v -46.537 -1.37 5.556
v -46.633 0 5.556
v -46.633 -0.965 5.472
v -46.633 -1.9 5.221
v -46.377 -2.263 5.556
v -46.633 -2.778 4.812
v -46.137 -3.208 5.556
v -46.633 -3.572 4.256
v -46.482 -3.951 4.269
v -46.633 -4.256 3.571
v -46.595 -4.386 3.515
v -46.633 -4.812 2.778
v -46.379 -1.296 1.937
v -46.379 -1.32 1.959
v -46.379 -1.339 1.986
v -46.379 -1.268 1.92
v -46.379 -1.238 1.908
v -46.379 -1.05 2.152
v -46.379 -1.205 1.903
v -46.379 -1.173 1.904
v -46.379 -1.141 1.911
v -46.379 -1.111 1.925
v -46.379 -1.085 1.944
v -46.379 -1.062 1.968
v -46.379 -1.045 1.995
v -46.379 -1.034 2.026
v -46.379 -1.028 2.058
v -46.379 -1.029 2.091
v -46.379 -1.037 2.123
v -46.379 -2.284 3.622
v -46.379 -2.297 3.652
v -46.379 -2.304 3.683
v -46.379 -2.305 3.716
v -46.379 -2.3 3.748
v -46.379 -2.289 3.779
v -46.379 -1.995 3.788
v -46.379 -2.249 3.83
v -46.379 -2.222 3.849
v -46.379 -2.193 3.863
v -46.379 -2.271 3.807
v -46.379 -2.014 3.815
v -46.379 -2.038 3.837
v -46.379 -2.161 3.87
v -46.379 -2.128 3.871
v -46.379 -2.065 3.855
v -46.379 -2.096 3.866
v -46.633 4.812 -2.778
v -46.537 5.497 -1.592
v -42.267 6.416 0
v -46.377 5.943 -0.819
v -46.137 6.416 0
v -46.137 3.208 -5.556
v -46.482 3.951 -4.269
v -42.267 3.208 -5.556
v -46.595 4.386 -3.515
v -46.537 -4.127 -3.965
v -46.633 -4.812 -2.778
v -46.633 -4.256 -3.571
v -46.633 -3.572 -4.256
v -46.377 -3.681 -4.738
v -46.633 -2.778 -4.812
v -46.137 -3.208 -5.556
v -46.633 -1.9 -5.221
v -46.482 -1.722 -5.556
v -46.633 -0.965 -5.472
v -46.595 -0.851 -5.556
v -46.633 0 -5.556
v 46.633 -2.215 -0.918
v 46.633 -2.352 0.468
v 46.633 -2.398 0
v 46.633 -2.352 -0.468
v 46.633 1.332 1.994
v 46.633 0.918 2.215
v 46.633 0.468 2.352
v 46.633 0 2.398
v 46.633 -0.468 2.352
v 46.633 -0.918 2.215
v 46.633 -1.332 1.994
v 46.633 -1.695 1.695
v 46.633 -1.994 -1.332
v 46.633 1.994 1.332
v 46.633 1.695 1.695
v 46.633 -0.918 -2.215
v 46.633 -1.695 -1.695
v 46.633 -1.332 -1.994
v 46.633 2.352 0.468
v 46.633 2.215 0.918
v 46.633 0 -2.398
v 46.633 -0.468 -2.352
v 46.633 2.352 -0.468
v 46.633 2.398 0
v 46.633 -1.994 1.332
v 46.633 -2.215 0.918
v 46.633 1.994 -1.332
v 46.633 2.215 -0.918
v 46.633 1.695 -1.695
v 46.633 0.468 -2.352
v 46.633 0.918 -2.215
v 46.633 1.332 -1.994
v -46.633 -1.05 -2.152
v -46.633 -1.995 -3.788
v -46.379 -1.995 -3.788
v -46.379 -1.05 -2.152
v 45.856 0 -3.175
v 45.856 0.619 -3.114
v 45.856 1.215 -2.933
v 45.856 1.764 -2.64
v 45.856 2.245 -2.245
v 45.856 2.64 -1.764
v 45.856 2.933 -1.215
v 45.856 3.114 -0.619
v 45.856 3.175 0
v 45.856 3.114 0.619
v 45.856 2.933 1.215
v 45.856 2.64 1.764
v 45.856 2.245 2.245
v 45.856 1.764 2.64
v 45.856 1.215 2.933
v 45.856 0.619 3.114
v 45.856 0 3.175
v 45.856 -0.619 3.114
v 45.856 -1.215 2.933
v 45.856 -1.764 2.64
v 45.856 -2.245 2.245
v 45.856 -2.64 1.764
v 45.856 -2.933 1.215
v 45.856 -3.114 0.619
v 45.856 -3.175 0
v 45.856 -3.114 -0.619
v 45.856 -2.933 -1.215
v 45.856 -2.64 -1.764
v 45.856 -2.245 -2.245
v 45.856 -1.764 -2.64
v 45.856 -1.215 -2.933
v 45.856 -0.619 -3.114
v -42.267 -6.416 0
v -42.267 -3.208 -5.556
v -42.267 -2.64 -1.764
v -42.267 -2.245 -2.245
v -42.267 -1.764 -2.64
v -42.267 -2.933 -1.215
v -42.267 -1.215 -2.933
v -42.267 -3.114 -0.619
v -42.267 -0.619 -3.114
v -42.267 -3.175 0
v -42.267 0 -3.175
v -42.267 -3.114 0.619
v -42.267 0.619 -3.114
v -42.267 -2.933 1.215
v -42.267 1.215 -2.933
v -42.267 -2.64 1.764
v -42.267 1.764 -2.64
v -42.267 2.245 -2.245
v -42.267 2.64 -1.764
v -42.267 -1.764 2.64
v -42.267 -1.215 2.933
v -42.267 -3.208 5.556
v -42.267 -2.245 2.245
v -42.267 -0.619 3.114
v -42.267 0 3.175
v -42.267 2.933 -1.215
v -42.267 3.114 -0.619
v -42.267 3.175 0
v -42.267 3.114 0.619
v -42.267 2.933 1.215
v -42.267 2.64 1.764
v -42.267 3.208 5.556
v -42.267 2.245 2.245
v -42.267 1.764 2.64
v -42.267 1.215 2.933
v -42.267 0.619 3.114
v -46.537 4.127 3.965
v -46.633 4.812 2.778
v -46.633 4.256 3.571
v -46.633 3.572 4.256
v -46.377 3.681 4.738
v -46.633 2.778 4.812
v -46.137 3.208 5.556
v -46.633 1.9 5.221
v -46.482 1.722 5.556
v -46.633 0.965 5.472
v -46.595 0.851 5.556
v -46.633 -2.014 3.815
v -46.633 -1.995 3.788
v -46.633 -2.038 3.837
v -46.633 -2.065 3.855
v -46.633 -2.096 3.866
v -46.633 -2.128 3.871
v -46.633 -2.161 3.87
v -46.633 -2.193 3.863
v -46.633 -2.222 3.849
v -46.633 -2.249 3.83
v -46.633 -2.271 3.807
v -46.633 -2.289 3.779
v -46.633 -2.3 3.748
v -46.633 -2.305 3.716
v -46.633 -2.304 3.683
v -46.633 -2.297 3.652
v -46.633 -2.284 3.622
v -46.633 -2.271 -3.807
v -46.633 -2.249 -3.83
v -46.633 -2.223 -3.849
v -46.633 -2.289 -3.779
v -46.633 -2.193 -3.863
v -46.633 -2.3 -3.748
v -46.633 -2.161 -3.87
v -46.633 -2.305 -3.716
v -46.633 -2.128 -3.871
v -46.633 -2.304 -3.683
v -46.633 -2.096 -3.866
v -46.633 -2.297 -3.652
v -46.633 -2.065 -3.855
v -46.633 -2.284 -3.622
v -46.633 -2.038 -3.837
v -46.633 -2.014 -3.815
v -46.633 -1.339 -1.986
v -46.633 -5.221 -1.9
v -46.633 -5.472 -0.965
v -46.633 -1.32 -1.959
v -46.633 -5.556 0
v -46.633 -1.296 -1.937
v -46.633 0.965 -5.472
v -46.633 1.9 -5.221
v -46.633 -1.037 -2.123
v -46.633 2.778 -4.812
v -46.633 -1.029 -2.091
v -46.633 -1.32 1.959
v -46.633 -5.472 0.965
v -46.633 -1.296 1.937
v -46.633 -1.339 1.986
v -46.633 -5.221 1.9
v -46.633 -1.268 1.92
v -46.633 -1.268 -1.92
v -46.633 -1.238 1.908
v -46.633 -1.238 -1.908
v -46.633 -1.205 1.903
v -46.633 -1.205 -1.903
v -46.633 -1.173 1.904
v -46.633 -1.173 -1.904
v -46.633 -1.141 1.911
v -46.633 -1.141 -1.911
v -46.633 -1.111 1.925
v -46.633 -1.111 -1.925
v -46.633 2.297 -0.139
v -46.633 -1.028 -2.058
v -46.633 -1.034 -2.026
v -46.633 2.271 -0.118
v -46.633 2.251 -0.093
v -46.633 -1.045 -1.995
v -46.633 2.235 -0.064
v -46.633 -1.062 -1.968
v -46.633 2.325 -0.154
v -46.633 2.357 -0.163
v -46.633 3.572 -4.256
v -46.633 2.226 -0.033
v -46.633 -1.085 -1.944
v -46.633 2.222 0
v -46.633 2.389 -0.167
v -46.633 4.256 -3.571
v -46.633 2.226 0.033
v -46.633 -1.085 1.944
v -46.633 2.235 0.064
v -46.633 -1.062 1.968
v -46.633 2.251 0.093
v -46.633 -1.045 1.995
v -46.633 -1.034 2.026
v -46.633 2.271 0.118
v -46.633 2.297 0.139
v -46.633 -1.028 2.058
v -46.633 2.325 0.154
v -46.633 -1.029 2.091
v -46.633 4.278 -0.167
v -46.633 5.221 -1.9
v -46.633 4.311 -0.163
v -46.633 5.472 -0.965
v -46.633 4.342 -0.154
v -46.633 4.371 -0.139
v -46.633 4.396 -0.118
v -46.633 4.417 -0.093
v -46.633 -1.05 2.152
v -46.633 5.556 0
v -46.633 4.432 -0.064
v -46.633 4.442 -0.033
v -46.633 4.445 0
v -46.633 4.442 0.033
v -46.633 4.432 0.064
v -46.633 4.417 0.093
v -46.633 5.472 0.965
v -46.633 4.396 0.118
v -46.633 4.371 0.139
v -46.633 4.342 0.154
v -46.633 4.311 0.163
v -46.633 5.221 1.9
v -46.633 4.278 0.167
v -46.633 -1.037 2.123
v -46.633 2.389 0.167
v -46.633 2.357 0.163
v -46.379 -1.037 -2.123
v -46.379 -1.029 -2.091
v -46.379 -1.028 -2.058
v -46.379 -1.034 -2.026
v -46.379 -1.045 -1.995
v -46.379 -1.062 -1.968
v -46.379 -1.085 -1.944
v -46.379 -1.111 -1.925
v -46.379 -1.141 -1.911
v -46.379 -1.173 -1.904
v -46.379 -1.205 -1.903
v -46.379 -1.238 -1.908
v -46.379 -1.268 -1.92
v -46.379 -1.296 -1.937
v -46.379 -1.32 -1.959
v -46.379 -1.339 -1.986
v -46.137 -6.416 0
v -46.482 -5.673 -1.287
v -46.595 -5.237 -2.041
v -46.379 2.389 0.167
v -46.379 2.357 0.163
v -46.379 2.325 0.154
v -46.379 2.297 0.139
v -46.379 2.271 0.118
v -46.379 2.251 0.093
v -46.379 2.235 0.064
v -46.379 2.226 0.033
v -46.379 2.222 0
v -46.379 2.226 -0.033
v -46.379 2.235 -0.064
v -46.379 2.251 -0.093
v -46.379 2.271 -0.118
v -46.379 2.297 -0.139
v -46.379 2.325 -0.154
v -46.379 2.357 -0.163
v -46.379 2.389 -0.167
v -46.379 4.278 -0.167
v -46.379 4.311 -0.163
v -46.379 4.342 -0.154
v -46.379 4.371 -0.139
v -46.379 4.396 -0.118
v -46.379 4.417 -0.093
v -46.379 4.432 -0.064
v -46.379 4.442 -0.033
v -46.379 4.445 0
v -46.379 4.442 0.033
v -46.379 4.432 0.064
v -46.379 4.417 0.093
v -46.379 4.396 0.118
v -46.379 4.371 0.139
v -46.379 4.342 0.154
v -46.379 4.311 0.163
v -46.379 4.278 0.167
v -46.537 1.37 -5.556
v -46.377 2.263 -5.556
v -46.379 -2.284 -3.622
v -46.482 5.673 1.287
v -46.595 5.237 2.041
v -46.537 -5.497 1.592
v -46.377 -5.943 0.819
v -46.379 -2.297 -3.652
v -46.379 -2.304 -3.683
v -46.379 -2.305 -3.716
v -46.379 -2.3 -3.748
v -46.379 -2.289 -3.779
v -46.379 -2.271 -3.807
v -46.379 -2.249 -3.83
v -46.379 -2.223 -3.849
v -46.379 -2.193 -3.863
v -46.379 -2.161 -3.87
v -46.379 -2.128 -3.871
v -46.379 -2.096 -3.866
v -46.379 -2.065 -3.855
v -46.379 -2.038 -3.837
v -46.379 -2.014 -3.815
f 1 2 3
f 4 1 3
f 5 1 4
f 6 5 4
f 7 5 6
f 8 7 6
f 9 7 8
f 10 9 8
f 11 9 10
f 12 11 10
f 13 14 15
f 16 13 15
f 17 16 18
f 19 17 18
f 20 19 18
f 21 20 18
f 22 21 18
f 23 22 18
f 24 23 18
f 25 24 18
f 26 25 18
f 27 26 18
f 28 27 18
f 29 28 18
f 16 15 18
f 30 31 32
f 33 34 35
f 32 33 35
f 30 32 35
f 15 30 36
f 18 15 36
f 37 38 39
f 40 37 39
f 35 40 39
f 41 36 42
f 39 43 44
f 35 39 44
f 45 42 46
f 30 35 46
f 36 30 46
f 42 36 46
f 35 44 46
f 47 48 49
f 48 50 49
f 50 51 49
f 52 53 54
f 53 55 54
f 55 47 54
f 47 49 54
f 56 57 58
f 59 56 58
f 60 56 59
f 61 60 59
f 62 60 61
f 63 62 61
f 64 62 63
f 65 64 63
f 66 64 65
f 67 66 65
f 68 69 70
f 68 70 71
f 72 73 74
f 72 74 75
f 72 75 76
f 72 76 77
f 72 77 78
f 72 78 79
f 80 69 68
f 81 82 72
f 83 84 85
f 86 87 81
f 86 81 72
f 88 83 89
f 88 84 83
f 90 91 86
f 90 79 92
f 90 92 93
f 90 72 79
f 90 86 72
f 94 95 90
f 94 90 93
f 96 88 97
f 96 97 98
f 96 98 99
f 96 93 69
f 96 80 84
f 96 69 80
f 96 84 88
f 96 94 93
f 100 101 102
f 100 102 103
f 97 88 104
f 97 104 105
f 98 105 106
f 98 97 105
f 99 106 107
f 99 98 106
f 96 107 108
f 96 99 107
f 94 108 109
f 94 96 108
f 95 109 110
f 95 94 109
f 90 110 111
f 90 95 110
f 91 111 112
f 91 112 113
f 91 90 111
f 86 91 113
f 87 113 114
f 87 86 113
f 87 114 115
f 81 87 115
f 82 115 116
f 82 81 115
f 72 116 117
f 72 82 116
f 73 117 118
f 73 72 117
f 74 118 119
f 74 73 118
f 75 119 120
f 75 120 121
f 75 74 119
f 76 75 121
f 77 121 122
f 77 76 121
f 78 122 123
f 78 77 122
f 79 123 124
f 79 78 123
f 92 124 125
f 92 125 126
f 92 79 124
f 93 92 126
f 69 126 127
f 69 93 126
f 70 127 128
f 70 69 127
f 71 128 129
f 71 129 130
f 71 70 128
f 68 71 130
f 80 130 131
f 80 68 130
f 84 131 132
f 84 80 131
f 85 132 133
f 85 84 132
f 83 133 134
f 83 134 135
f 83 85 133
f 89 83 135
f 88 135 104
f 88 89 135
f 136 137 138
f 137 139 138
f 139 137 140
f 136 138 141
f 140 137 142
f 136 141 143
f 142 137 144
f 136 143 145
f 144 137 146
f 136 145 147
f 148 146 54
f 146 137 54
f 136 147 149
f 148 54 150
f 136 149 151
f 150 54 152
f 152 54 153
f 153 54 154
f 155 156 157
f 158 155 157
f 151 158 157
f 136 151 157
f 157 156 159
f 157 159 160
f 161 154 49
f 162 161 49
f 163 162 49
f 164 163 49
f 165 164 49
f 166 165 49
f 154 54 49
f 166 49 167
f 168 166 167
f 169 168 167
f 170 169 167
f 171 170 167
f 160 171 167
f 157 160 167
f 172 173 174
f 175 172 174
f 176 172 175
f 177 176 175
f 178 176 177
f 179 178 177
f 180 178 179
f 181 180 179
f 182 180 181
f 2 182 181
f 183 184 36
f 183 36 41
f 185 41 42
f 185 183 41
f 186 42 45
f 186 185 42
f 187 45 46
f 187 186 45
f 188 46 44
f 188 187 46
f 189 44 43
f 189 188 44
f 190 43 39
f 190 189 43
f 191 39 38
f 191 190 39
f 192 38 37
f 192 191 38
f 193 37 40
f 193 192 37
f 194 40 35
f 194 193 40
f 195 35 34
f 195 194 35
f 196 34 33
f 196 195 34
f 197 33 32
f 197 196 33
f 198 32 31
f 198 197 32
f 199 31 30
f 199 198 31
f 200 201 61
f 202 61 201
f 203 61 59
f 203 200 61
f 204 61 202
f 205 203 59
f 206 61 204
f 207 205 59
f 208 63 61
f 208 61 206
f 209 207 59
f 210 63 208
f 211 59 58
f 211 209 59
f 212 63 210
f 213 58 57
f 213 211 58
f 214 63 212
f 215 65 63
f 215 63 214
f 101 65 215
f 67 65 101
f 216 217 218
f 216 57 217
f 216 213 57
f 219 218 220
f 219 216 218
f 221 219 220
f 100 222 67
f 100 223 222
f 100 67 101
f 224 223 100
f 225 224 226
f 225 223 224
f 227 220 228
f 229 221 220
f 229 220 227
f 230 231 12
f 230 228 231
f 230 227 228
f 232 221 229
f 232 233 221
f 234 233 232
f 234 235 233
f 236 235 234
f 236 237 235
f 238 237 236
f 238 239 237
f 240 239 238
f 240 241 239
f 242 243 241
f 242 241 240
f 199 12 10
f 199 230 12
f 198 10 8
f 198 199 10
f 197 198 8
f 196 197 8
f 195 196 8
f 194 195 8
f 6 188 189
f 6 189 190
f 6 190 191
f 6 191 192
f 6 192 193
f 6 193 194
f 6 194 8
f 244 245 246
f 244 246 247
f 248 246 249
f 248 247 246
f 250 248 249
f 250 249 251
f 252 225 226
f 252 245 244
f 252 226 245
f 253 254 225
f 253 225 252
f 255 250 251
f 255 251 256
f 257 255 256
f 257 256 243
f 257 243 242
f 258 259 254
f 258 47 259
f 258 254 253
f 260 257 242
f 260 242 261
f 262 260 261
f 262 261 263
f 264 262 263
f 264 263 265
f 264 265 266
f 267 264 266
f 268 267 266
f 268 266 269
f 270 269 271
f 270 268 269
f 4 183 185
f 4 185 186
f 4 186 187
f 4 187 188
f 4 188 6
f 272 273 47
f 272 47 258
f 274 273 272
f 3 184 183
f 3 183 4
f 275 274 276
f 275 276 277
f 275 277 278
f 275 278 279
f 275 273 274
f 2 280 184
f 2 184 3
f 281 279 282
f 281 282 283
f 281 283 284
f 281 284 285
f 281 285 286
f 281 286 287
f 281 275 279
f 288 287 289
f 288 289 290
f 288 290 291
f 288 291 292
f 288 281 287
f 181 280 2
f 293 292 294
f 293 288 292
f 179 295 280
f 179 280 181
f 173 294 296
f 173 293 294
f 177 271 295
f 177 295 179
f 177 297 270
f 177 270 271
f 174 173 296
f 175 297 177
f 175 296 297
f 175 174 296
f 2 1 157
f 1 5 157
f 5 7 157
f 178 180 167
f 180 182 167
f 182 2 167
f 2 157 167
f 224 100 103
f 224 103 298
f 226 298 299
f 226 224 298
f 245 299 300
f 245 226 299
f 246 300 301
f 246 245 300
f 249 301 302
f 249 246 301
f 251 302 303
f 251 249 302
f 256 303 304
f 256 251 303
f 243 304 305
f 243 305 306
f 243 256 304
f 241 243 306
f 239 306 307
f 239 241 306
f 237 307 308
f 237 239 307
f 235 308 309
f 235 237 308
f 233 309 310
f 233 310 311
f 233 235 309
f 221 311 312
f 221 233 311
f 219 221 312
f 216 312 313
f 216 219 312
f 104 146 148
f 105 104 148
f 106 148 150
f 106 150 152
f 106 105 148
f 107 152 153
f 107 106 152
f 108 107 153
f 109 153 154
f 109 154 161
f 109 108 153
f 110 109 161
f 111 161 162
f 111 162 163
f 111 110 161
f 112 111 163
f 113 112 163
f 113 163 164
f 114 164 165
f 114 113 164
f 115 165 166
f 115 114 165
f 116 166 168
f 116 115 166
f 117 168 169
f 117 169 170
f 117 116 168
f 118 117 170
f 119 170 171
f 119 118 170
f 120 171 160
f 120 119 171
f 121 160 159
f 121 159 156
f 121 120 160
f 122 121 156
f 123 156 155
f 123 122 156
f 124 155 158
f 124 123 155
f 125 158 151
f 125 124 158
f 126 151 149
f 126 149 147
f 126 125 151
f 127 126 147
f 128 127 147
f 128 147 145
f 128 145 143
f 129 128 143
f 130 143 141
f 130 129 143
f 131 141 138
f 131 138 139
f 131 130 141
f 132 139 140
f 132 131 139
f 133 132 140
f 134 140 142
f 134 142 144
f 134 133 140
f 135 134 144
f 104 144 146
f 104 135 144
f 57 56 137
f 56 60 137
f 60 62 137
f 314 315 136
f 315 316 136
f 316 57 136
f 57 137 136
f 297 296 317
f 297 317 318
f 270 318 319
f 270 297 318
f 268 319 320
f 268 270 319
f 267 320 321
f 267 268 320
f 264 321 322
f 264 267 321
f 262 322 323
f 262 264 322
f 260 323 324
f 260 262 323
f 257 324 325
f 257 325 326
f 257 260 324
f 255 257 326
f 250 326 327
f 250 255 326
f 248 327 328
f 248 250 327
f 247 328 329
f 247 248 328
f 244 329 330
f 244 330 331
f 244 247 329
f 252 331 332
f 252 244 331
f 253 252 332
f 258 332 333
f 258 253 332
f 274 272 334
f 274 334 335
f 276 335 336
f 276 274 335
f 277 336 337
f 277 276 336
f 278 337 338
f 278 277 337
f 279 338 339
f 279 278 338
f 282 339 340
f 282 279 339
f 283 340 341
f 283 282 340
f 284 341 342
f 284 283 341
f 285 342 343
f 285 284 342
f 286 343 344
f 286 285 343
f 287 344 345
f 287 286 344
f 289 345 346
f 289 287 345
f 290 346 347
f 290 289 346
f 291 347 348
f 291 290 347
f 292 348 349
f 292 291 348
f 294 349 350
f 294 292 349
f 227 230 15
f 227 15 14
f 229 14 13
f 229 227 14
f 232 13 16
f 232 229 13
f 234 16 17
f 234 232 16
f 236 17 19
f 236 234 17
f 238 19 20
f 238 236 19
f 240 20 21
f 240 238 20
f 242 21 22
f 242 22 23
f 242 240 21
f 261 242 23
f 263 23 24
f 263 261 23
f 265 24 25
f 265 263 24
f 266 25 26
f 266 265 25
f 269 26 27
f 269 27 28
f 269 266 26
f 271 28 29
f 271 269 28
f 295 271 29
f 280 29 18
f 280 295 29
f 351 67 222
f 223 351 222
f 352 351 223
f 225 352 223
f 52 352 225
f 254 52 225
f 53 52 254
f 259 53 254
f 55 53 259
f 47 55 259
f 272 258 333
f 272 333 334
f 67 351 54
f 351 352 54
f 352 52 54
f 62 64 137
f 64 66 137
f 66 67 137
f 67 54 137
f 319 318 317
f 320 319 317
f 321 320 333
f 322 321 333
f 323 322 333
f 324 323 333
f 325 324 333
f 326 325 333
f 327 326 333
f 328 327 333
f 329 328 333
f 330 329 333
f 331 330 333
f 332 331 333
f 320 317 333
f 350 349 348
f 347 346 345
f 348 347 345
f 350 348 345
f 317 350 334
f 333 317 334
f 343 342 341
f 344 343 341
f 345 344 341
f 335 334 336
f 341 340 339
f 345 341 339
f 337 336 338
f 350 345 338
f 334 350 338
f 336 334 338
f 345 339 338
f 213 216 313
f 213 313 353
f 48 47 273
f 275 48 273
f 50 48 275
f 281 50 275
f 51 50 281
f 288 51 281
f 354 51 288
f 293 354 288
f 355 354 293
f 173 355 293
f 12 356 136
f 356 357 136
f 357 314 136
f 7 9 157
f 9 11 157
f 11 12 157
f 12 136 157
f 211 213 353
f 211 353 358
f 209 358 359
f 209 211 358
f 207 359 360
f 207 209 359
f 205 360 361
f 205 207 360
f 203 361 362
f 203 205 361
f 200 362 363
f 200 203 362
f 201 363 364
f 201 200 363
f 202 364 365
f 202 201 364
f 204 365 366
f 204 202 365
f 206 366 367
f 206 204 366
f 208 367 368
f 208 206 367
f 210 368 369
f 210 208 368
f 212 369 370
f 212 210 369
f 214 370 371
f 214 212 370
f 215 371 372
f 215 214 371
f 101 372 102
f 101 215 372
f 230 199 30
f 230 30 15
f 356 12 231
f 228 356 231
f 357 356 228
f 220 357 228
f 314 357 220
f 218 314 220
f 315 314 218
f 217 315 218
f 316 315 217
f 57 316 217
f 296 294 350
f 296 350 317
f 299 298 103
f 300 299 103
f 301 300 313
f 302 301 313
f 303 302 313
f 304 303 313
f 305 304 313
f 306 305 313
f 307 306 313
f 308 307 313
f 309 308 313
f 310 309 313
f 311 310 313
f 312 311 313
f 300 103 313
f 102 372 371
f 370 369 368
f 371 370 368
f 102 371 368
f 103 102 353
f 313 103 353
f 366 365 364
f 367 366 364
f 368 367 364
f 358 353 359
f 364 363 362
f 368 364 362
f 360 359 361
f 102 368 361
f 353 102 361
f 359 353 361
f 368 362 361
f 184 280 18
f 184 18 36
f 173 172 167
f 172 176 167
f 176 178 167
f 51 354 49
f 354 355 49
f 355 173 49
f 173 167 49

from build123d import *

# Parameters (mm, degrees)
SKETCH5_R           = 3.175
BOSS_EXTRUDE3_DEPTH = 88.9
CHAMFER1_SIZE       = 0.77724
BOSS_EXTRUDE4_DEPTH = 4.365625
SKETCH8_OUTSIDE_W   = 358.618
SKETCH8_OUTSIDE_H   = 360.338
SKETCH8_OUTSIDE_R   = 5.55625
CUT_EXTRUDE3_DEPTH  = 94.265625
CUT_EXTRUDE3_TAPER  = 60
CUT_EXTRUDE4_DEPTH  = 0.254
CIRPATTERN1_COUNT   = 3


with BuildPart() as part:
    # Sketch5 → Boss-Extrude3 (new body)
    with BuildSketch(Plane(origin=(46.6328125, 0, 0), x_dir=(0, 0, -1), z_dir=(1, 0, 0))):
        Circle(SKETCH5_R)
    extrude(amount=-BOSS_EXTRUDE3_DEPTH)

    # Chamfer1
    chamfer1_edges = [part.edges().sort_by_distance(p)[0] for p in [
        (46.6328125, 0, 3.175),
    ]]
    chamfer(chamfer1_edges, length=CHAMFER1_SIZE)

    # Sketch6 → Boss-Extrude4 (add)
    with BuildSketch(Plane.ZY.offset(42.2671875)):
        Polygon((5.55625, 3.207902433), (0, 6.415804866), (-5.55625, 3.207902433), (-5.55625, -3.207902433), (0, -6.415804866), (5.55625, -3.207902433), align=None)
    extrude(amount=BOSS_EXTRUDE4_DEPTH)

    # Sketch8 outside → Cut-Extrude3 (cut, through all)
    with BuildSketch(Plane.ZY.offset(46.6328125)):
        Rectangle(SKETCH8_OUTSIDE_W, SKETCH8_OUTSIDE_H)
        Circle(SKETCH8_OUTSIDE_R, mode=Mode.SUBTRACT)
    extrude(amount=-CUT_EXTRUDE3_DEPTH, taper=CUT_EXTRUDE3_TAPER, mode=Mode.SUBTRACT)

    # Sketch12 → Cut-Extrude4 (cut)
    with BuildSketch(Plane.ZY.offset(46.6328125)):
        with BuildLine():
            Line((0.1666875, 4.2783125), (0.1666875, 2.3891875))
            ThreePointArc((0.1666875, 2.3891875), (0, 2.2225), (-0.1666875, 2.3891875))
            Line((-0.1666875, 2.3891875), (-0.1666875, 4.2783125))
            ThreePointArc((-0.1666875, 4.2783125), (0, 4.445), (0.1666875, 4.2783125))
        make_face()
    cut_extrude4 = extrude(amount=-CUT_EXTRUDE4_DEPTH, mode=Mode.SUBTRACT)

    # CirPattern1: Cut-Extrude4 ×3 about axis
    cirpattern1_axis = Axis((0, 0, 0), (1, 0, 0))
    for i in range(1, CIRPATTERN1_COUNT):
        add(cut_extrude4.rotate(cirpattern1_axis, i * 360 / CIRPATTERN1_COUNT), mode=Mode.SUBTRACT)


solid = part.part
